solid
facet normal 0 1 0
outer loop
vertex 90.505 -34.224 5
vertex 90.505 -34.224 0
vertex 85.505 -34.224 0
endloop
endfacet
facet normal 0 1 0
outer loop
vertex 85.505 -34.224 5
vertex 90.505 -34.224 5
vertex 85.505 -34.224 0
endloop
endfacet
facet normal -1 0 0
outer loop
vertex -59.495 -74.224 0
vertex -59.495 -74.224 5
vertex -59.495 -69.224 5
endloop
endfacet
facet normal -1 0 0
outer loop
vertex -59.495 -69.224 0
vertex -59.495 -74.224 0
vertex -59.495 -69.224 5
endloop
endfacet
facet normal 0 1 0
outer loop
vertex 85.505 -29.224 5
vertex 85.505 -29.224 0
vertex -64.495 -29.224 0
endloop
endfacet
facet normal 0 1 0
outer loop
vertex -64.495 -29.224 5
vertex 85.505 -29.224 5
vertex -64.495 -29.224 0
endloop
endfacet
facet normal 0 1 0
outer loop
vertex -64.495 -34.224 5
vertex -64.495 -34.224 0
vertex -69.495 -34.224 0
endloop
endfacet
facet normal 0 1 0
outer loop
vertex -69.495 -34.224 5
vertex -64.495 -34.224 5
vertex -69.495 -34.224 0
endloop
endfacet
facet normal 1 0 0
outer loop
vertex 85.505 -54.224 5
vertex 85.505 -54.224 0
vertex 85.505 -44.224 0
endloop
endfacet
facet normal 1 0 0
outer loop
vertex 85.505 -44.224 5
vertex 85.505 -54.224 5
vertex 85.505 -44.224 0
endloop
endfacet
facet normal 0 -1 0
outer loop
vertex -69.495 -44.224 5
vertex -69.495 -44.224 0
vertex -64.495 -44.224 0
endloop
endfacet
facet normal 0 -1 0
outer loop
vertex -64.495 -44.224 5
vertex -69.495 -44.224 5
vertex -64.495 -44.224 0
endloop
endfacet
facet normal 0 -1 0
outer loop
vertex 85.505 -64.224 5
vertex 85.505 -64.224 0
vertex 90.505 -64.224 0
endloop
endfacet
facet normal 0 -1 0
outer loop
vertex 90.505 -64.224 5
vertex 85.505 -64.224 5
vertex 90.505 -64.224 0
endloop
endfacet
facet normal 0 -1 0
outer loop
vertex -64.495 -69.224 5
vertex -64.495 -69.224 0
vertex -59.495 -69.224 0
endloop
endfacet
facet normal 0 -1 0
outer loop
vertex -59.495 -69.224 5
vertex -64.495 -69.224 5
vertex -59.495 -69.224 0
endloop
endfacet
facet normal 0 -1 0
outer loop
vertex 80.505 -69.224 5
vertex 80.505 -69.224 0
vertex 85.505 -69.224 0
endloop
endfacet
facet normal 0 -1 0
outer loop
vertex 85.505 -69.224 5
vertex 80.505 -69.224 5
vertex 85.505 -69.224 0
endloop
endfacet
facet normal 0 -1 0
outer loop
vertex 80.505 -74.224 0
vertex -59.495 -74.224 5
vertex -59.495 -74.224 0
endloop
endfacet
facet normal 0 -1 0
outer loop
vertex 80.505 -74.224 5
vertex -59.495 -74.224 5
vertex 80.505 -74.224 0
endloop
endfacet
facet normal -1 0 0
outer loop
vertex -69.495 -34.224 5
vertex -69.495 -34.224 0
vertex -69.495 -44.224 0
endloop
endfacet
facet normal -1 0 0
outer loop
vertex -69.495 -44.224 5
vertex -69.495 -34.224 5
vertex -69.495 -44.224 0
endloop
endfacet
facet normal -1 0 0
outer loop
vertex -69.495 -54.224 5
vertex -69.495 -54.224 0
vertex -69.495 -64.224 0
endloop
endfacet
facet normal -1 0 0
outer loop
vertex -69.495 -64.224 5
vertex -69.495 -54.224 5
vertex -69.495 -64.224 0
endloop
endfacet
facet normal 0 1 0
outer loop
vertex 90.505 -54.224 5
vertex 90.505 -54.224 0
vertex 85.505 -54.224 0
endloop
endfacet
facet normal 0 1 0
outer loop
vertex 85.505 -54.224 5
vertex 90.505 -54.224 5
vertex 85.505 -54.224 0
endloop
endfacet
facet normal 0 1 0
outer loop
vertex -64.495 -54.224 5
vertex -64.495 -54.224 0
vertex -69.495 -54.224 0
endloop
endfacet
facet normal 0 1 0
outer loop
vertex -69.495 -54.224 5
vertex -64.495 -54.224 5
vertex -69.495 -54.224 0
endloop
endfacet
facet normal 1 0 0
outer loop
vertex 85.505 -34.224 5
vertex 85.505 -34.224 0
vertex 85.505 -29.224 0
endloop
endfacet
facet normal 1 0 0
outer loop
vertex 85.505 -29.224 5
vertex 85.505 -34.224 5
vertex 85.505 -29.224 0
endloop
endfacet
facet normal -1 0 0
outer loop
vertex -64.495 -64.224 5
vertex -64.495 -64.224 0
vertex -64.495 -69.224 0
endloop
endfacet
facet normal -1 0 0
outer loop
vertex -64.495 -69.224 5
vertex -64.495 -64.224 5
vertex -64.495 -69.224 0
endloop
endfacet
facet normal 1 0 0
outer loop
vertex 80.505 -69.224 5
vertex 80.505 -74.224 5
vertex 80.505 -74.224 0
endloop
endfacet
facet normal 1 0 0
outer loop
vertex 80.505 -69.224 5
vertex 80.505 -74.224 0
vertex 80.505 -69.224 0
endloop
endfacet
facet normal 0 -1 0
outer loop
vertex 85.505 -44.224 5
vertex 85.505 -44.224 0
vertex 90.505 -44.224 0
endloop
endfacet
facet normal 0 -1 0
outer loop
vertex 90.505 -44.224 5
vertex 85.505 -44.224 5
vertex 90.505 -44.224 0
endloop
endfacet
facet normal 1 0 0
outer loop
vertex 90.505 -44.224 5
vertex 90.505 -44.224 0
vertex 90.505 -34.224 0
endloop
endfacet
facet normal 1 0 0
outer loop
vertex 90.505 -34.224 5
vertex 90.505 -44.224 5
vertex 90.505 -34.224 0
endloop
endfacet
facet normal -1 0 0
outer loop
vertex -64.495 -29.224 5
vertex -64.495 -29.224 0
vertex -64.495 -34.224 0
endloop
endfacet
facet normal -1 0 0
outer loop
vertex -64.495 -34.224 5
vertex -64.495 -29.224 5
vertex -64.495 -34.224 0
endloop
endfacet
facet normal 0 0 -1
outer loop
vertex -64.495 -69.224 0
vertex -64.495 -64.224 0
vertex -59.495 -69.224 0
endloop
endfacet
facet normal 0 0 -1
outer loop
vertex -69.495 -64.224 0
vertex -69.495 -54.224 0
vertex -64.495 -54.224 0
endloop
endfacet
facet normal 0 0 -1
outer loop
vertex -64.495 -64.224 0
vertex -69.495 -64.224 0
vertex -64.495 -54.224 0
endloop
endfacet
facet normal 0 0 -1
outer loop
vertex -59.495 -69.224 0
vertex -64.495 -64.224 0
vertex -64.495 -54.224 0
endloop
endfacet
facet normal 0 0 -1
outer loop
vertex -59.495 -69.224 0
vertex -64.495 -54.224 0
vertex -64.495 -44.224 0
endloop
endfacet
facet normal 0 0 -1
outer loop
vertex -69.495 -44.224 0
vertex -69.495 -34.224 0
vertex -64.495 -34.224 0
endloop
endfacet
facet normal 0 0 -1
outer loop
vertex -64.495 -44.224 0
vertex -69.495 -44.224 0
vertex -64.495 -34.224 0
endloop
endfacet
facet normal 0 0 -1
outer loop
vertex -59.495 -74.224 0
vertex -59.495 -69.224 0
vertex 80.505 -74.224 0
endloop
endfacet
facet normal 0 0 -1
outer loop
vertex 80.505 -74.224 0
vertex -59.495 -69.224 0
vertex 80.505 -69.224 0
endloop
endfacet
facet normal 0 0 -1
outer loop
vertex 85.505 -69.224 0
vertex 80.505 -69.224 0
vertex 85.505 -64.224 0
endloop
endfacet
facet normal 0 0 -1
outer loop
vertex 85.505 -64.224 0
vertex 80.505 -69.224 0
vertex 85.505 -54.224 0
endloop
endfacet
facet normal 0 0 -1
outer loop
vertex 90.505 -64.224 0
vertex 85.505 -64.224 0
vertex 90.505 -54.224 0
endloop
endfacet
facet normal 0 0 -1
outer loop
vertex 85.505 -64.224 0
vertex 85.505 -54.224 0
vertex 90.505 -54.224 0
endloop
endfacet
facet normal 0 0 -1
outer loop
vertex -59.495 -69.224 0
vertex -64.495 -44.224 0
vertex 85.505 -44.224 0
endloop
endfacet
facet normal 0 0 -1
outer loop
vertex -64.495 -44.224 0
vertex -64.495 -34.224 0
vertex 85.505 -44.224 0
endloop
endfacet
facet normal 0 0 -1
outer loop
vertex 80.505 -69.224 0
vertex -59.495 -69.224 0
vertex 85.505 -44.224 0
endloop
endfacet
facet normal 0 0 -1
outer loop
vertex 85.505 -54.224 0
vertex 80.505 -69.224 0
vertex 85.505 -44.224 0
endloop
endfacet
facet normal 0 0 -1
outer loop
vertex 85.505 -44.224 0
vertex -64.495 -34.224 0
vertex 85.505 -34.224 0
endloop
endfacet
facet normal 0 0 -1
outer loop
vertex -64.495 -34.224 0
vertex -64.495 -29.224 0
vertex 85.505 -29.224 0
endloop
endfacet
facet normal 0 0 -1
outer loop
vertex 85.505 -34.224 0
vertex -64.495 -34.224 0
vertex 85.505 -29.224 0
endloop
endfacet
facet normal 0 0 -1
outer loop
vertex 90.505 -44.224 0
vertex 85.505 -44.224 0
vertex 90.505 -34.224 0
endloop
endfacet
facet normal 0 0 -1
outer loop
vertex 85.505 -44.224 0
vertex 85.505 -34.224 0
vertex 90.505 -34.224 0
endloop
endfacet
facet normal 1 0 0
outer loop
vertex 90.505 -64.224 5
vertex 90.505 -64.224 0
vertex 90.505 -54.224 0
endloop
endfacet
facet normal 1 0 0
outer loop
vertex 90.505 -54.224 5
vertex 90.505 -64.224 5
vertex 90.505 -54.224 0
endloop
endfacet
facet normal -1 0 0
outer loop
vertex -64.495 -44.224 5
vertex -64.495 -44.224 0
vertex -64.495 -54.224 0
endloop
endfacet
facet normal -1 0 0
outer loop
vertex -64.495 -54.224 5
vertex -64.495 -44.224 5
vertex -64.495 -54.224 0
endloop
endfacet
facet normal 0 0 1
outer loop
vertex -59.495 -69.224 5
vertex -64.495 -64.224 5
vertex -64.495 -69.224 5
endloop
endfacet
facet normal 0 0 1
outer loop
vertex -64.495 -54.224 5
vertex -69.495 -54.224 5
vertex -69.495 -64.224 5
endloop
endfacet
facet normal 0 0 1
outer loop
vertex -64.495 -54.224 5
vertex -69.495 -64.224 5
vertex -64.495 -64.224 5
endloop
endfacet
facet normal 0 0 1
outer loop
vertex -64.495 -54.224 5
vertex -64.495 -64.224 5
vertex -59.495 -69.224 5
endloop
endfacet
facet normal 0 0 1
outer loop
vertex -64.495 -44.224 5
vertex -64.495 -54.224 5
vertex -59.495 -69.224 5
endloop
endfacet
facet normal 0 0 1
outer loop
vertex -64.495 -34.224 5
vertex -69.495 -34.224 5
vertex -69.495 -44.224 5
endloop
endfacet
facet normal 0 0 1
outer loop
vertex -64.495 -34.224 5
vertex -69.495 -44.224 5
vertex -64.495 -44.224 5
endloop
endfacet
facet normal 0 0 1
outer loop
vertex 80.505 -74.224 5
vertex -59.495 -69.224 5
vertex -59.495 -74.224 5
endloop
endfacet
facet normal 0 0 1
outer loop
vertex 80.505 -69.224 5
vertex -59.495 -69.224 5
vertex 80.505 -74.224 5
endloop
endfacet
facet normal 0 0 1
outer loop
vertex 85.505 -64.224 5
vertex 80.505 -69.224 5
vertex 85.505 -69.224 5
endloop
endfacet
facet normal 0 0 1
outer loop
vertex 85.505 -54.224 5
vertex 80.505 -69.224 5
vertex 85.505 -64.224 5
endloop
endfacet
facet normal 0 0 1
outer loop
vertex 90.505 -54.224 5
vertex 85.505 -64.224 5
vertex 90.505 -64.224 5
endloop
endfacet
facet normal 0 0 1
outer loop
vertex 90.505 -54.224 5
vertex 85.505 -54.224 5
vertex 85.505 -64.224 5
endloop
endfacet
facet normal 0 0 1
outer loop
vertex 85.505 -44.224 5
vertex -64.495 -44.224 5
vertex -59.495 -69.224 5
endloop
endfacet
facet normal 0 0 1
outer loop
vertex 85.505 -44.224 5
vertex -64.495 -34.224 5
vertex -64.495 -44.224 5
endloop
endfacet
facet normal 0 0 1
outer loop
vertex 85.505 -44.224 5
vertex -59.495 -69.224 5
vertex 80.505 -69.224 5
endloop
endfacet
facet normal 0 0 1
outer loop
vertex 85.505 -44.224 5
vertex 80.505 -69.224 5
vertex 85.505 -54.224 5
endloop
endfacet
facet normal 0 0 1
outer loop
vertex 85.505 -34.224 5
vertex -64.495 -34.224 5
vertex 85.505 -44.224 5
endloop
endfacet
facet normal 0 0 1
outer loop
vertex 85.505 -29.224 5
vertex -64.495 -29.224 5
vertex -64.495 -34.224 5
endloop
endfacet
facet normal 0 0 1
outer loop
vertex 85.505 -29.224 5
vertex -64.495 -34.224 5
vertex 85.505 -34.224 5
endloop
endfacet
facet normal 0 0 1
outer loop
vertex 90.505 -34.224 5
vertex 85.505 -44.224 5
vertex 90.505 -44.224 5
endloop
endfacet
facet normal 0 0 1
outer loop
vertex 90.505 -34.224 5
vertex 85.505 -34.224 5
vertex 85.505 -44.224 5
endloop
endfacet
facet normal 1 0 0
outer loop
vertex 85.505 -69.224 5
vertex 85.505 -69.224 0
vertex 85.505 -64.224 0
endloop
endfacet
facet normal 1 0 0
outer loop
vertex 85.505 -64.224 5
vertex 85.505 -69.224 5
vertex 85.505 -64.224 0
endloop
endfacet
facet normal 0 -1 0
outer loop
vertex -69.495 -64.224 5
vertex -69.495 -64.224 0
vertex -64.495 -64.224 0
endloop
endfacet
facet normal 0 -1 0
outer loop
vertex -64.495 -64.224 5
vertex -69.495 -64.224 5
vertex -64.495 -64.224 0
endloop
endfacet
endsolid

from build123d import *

# Parameters (mm, degrees)
BOSS_EXTRU_1_DEPTH = 5
ESQUISSE2_W        = 140
ESQUISSE2_H        = 5
BOSS_EXTRU_2_DEPTH = 5


with BuildPart() as part:
    # Esquisse1 → Boss.-Extru.1 (new body)
    with BuildSketch(Plane.XY):
        Polygon((85.505013729, -34.223744292), (85.505013729, -29.223744292), (-64.494986271, -29.223744292), (-64.494986271, -34.223744292), (-69.494986271, -34.223744292), (-69.494986271, -44.223744292), (-64.494986271, -44.223744292), (-64.494986271, -54.223744292), (-69.494986271, -54.223744292), (-69.494986271, -64.223744292), (-64.494986271, -64.223744292), (-64.494986271, -69.223744292), (85.505013729, -69.223744292), (85.505013729, -64.223744292), (90.505013729, -64.223744292), (90.505013729, -54.223744292), (85.505013729, -54.223744292), (85.505013729, -44.223744292), (90.505013729, -44.223744292), (90.505013729, -34.223744292), align=None)
    extrude(amount=BOSS_EXTRU_1_DEPTH)

    # Esquisse2 → Boss.-Extru.2 (add)
    with BuildSketch(Plane.XY.offset(5)):
        with Locations((10.505013729, -71.723744292)):
            Rectangle(ESQUISSE2_W, ESQUISSE2_H)
    extrude(amount=-BOSS_EXTRU_2_DEPTH)


solid = part.part
